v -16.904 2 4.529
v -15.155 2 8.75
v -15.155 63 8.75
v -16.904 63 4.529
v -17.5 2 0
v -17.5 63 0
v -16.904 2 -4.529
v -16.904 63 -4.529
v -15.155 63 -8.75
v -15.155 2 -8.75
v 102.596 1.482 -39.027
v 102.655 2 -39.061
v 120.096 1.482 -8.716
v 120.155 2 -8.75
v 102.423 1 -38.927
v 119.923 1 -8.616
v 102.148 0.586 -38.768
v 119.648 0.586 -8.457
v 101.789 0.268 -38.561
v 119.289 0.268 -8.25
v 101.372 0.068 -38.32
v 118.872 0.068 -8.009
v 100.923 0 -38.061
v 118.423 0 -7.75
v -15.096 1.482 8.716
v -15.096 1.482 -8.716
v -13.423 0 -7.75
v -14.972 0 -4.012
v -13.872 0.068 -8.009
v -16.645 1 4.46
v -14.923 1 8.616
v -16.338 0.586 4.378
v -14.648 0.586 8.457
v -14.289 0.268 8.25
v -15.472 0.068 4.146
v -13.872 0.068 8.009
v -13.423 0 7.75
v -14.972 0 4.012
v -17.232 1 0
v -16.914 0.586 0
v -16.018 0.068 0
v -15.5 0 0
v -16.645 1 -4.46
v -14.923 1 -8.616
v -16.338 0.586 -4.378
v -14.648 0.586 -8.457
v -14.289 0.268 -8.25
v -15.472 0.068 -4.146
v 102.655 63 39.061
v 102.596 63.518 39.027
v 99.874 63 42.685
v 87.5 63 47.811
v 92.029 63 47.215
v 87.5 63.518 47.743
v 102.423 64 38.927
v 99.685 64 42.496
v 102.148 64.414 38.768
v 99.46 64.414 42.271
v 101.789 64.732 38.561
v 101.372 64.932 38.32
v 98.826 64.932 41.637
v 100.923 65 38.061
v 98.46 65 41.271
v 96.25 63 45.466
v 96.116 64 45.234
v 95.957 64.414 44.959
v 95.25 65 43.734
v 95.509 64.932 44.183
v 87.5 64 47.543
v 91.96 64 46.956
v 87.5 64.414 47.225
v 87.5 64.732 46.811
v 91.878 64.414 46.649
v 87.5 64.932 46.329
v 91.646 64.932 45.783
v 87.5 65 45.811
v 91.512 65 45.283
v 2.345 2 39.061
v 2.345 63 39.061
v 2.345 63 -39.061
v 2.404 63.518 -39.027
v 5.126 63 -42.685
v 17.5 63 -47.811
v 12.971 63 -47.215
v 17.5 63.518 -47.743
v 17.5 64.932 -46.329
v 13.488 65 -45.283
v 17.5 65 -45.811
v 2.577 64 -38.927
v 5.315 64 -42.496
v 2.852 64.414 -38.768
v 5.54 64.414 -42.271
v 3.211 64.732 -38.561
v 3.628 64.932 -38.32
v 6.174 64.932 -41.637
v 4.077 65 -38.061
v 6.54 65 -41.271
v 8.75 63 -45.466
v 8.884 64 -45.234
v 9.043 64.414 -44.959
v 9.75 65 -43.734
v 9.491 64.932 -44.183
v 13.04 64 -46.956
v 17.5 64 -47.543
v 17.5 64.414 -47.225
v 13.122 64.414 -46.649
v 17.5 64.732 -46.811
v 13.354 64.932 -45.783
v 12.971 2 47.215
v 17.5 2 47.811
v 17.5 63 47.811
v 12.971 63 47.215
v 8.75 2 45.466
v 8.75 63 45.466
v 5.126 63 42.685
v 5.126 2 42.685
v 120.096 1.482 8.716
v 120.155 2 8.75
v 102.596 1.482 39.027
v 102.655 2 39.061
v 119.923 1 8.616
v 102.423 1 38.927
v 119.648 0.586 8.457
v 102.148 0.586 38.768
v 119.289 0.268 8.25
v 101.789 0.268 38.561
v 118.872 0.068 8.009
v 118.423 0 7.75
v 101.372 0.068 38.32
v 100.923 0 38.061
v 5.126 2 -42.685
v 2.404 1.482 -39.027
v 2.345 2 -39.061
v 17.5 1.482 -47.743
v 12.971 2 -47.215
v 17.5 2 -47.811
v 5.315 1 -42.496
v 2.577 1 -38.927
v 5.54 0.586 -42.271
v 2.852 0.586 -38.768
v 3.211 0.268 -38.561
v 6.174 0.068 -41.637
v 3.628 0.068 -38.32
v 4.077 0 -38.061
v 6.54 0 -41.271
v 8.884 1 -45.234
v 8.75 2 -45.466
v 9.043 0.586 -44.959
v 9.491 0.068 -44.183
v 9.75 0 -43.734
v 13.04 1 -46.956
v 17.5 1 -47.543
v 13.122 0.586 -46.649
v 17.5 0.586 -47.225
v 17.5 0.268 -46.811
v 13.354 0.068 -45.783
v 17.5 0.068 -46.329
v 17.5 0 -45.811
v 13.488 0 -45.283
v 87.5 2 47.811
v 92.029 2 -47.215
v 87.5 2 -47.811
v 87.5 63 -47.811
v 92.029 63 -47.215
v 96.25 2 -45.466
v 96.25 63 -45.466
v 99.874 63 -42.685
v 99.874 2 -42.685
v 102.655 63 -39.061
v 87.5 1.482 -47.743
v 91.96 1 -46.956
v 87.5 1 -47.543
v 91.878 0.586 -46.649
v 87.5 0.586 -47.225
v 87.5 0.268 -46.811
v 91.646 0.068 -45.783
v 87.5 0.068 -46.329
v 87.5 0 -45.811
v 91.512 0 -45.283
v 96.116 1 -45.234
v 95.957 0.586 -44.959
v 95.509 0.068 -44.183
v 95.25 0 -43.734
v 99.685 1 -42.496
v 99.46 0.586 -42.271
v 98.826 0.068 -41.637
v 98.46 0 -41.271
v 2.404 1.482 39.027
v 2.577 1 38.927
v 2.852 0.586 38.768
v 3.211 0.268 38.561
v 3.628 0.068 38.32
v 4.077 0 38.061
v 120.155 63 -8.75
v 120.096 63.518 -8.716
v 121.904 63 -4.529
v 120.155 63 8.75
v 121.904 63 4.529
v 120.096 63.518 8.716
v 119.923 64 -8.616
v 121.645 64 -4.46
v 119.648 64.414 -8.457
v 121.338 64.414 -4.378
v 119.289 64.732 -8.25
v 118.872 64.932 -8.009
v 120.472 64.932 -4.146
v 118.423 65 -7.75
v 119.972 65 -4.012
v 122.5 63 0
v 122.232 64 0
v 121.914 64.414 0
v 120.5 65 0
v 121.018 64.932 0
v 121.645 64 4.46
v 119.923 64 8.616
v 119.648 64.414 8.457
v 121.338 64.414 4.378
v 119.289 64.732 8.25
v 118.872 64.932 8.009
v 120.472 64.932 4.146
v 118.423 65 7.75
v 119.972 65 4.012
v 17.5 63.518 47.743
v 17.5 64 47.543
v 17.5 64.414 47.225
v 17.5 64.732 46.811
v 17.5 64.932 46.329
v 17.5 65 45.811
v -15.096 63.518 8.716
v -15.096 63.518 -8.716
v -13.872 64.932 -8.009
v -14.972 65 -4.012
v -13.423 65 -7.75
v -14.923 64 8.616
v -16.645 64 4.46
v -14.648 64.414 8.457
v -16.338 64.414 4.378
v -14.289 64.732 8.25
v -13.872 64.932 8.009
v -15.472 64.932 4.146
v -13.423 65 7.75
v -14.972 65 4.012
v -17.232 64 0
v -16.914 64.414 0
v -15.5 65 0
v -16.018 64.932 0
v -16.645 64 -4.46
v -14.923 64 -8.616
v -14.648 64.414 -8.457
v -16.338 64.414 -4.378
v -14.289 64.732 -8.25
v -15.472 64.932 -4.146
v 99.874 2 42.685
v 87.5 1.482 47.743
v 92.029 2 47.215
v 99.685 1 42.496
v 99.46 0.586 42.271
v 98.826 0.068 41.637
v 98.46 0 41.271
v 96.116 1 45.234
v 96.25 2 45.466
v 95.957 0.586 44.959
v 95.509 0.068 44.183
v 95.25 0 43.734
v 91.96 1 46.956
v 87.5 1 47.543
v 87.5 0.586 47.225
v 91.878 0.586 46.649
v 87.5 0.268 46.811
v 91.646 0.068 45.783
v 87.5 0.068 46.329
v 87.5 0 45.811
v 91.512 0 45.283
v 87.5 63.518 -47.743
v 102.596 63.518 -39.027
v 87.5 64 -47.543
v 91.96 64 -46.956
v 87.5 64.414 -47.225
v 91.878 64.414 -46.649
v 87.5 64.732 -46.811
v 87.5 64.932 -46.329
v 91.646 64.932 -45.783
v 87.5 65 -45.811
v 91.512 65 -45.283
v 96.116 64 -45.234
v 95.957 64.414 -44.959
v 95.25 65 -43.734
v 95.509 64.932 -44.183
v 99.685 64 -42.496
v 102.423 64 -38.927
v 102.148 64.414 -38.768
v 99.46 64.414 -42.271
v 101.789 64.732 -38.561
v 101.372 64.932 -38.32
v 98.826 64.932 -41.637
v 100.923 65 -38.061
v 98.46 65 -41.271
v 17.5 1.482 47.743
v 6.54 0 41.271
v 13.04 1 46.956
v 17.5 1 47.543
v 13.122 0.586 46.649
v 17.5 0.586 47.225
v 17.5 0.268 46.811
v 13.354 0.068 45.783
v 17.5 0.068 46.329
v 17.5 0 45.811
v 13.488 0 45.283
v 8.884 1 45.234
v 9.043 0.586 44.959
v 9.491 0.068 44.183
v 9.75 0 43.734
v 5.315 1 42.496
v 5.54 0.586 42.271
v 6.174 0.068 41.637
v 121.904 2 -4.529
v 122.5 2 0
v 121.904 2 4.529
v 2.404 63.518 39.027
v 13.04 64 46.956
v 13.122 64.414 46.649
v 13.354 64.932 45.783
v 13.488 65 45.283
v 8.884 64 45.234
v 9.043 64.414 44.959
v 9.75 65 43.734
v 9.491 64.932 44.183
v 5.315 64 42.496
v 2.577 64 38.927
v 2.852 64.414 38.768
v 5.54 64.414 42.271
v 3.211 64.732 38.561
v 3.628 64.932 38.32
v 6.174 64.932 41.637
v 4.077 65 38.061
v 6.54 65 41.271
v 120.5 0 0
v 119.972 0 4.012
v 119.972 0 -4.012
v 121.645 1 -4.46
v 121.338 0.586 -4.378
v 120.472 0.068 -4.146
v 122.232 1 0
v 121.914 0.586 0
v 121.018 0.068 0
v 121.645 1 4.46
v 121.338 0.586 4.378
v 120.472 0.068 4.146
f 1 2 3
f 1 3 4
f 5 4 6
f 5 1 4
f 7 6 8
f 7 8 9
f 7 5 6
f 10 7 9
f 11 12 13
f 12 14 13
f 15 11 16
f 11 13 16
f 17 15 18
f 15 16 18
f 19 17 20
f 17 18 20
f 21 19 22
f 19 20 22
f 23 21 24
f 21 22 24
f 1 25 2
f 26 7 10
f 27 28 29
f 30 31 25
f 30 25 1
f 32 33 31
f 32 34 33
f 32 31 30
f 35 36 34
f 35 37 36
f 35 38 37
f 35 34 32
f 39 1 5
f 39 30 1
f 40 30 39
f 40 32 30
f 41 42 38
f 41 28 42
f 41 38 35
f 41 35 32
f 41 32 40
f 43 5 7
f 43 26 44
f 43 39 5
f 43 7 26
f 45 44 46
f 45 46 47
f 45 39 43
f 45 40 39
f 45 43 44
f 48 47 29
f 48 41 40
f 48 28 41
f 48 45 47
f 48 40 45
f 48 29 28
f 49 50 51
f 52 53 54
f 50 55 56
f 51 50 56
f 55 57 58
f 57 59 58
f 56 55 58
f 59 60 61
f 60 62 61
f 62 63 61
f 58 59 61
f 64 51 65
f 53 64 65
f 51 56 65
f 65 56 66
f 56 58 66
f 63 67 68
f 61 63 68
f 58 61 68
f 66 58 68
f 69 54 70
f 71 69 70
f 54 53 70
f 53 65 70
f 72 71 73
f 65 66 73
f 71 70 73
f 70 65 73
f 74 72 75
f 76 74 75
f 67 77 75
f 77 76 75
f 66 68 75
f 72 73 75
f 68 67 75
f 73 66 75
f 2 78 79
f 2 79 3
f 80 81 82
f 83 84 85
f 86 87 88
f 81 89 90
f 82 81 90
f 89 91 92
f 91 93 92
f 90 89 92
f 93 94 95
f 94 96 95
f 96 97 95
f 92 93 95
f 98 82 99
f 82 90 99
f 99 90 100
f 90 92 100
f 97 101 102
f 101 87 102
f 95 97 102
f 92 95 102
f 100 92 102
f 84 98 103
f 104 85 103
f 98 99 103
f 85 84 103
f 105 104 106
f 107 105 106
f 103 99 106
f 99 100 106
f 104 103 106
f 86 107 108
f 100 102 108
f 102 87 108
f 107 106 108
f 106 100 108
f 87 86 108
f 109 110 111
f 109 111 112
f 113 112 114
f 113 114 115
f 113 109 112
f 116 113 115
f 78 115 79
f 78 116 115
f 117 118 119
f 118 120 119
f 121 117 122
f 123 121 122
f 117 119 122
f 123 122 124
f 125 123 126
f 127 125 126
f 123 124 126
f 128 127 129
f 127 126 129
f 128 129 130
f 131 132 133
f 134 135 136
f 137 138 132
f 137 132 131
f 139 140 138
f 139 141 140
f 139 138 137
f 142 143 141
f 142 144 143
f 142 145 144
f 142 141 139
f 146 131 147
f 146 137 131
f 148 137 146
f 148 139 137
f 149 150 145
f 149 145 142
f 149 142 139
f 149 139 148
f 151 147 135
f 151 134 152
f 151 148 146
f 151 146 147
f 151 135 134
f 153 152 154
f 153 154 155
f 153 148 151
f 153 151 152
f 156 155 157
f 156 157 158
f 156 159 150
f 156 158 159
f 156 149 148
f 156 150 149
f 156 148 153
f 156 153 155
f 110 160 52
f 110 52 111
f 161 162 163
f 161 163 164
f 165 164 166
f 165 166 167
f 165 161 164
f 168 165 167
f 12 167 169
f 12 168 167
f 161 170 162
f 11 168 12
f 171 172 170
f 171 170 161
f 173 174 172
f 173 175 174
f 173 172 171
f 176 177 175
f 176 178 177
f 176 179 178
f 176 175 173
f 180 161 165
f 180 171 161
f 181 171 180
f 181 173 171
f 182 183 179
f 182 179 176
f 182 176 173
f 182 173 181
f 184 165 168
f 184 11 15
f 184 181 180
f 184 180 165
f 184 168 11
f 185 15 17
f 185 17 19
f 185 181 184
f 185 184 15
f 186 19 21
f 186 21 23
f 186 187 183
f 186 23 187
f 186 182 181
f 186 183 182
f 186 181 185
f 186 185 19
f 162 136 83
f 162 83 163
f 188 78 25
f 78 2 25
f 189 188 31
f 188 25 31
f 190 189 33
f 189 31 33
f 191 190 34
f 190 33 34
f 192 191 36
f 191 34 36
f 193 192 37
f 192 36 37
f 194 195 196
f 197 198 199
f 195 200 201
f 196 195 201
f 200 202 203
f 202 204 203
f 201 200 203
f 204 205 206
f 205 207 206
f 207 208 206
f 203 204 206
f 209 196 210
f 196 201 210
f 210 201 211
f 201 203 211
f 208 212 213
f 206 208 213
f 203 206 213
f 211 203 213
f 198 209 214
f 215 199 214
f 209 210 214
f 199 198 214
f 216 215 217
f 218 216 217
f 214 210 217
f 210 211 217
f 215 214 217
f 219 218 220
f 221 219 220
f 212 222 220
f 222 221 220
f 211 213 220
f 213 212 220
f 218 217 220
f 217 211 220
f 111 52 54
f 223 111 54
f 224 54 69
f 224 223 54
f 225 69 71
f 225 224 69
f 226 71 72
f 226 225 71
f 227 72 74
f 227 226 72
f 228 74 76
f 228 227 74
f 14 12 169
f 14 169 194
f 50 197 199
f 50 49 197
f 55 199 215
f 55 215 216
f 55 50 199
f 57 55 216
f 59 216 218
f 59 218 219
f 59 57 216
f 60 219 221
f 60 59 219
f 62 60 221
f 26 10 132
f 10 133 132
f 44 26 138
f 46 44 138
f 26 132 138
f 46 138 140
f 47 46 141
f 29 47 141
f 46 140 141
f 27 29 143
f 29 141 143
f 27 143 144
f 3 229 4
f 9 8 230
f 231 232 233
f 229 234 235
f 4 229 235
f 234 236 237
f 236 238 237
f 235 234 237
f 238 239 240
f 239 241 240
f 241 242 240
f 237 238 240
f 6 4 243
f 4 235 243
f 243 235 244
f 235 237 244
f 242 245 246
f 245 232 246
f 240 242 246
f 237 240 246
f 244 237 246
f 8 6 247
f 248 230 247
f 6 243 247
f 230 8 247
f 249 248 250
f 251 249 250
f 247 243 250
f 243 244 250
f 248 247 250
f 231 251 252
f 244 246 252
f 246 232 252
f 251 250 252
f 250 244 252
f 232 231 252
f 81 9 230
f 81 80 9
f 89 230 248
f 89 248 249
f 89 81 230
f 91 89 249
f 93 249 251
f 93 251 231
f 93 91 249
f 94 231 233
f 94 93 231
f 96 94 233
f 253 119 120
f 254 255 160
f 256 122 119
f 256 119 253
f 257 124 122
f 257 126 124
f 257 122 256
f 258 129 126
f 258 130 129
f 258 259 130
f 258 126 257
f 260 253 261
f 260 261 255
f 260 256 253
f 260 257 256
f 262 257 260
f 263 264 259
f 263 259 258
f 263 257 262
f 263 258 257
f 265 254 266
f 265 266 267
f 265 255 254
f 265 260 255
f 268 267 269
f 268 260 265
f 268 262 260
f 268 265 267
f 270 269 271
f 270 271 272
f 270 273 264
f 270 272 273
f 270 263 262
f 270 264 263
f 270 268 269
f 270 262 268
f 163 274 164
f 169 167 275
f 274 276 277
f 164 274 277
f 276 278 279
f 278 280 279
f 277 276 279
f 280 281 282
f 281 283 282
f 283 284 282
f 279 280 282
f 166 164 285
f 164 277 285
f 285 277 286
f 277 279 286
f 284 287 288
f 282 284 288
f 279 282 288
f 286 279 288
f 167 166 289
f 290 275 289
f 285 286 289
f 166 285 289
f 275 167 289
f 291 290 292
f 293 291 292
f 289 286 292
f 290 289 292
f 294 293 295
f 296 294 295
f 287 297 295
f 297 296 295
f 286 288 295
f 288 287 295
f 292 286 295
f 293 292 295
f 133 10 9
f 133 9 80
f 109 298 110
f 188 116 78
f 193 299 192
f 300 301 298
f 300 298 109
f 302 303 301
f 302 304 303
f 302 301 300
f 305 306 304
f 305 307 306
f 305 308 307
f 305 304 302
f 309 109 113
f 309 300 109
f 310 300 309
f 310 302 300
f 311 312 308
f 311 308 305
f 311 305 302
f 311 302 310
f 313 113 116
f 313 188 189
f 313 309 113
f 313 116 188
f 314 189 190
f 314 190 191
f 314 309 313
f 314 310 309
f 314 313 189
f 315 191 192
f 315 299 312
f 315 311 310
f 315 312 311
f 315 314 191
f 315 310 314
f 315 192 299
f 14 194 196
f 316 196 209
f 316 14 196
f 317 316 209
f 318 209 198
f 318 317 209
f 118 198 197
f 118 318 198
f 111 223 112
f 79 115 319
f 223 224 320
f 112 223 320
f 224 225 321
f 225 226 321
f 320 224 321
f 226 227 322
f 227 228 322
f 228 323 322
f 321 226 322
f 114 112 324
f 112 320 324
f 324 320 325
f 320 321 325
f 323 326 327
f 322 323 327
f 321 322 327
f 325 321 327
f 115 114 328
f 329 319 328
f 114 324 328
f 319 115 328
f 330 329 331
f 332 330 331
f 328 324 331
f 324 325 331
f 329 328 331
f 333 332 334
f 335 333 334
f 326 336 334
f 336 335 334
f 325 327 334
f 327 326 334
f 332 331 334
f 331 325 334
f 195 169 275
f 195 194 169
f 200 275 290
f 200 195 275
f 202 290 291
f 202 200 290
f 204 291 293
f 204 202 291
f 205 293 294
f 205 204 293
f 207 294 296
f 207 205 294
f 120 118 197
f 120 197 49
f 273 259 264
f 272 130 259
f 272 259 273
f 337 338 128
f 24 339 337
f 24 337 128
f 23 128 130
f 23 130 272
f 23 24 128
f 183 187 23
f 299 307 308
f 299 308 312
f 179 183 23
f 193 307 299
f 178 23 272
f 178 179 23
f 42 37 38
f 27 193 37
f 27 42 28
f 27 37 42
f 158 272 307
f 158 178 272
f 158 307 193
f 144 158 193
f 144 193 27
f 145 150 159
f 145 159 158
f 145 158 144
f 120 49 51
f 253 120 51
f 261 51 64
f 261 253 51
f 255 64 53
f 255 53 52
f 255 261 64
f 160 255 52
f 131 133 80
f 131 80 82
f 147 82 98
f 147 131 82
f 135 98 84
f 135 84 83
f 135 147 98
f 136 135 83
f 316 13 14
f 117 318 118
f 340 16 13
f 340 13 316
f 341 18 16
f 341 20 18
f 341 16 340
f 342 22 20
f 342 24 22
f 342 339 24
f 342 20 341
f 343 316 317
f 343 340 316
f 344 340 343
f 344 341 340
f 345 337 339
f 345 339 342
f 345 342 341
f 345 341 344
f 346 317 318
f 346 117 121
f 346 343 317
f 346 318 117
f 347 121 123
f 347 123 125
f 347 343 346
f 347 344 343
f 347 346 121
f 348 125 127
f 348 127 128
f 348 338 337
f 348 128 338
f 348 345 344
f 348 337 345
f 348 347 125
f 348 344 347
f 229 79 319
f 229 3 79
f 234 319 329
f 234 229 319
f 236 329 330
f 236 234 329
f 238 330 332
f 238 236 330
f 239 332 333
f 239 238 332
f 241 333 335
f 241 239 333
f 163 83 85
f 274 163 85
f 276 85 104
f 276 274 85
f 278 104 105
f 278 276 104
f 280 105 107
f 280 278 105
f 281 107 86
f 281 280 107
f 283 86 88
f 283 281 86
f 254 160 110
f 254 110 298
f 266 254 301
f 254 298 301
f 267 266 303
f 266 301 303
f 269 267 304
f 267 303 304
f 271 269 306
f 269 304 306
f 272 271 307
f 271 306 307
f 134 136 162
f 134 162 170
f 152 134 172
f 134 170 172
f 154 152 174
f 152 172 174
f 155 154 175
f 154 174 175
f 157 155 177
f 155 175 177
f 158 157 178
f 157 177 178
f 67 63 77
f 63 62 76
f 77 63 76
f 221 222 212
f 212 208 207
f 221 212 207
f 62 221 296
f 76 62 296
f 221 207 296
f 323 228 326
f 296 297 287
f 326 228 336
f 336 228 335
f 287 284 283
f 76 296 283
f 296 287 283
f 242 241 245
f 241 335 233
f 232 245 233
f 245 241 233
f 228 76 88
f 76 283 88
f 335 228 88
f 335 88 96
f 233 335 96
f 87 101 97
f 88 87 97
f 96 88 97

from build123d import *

# Parameters (mm, degrees)
EXTRUDE1_DEPTH = 65
FILLET1_R      = 2


with BuildPart() as part:
    # Sketch1 → Extrude1 (new body)
    with BuildSketch(Plane(origin=(0, 0, 0), x_dir=(1, 0, 0), z_dir=(0, 1, 0))):
        with BuildLine():
            Line((-15.155444566, 8.75), (2.344555434, 39.060889132))
            ThreePointArc((2.344555434, 39.060889132), (8.75, 45.466333699), (17.5, 47.810889132))
            Line((17.5, 47.810889132), (87.5, 47.810889132))
            ThreePointArc((87.5, 47.810889132), (96.25, 45.466333699), (102.655444566, 39.060889132))
            Line((102.655444566, 39.060889132), (120.155444566, 8.75))
            ThreePointArc((120.155444566, 8.75), (122.5, 0), (120.155444566, -8.75))
            Line((120.155444566, -8.75), (102.655444566, -39.060889132))
            ThreePointArc((102.655444566, -39.060889132), (96.25, -45.466333699), (87.5, -47.810889132))
            Line((87.5, -47.810889132), (17.5, -47.810889132))
            ThreePointArc((17.5, -47.810889132), (8.75, -45.466333699), (2.344555434, -39.060889132))
            Line((2.344555434, -39.060889132), (-15.155444566, -8.75))
            ThreePointArc((-15.155444566, -8.75), (-17.5, 0), (-15.155444566, 8.75))
        make_face()
    extrude(amount=EXTRUDE1_DEPTH)

    # Fillet1
    fillet1_edges = [part.edges().sort_by_distance(p)[0] for p in [
        (8.75, 65, 45.466333699),
        (-6.405444566, 0, -23.905444566),
        (8.75, 0, -45.466333699),
        (52.5, 0, -47.810889132),
        (96.25, 0, -45.466333699),
        (111.405444566, 0, -23.905444566),
        (122.5, 0, 0),
        (52.5, 65, 47.810889132),
        (111.405444566, 0, 23.905444566),
        (96.25, 0, 45.466333699),
        (52.5, 0, 47.810889132),
        (8.75, 0, 45.466333699),
        (-6.405444566, 0, 23.905444566),
        (-17.5, 0, 0),
        (96.25, 65, 45.466333699),
        (111.405444566, 65, 23.905444566),
        (122.5, 65, 0),
        (111.405444566, 65, -23.905444566),
        (96.25, 65, -45.466333699),
        (52.5, 65, -47.810889132),
        (8.75, 65, -45.466333699),
        (-6.405444566, 65, -23.905444566),
        (-17.5, 65, 0),
        (-6.405444566, 65, 23.905444566),
    ]]
    fillet(fillet1_edges, radius=FILLET1_R)


solid = part.part
